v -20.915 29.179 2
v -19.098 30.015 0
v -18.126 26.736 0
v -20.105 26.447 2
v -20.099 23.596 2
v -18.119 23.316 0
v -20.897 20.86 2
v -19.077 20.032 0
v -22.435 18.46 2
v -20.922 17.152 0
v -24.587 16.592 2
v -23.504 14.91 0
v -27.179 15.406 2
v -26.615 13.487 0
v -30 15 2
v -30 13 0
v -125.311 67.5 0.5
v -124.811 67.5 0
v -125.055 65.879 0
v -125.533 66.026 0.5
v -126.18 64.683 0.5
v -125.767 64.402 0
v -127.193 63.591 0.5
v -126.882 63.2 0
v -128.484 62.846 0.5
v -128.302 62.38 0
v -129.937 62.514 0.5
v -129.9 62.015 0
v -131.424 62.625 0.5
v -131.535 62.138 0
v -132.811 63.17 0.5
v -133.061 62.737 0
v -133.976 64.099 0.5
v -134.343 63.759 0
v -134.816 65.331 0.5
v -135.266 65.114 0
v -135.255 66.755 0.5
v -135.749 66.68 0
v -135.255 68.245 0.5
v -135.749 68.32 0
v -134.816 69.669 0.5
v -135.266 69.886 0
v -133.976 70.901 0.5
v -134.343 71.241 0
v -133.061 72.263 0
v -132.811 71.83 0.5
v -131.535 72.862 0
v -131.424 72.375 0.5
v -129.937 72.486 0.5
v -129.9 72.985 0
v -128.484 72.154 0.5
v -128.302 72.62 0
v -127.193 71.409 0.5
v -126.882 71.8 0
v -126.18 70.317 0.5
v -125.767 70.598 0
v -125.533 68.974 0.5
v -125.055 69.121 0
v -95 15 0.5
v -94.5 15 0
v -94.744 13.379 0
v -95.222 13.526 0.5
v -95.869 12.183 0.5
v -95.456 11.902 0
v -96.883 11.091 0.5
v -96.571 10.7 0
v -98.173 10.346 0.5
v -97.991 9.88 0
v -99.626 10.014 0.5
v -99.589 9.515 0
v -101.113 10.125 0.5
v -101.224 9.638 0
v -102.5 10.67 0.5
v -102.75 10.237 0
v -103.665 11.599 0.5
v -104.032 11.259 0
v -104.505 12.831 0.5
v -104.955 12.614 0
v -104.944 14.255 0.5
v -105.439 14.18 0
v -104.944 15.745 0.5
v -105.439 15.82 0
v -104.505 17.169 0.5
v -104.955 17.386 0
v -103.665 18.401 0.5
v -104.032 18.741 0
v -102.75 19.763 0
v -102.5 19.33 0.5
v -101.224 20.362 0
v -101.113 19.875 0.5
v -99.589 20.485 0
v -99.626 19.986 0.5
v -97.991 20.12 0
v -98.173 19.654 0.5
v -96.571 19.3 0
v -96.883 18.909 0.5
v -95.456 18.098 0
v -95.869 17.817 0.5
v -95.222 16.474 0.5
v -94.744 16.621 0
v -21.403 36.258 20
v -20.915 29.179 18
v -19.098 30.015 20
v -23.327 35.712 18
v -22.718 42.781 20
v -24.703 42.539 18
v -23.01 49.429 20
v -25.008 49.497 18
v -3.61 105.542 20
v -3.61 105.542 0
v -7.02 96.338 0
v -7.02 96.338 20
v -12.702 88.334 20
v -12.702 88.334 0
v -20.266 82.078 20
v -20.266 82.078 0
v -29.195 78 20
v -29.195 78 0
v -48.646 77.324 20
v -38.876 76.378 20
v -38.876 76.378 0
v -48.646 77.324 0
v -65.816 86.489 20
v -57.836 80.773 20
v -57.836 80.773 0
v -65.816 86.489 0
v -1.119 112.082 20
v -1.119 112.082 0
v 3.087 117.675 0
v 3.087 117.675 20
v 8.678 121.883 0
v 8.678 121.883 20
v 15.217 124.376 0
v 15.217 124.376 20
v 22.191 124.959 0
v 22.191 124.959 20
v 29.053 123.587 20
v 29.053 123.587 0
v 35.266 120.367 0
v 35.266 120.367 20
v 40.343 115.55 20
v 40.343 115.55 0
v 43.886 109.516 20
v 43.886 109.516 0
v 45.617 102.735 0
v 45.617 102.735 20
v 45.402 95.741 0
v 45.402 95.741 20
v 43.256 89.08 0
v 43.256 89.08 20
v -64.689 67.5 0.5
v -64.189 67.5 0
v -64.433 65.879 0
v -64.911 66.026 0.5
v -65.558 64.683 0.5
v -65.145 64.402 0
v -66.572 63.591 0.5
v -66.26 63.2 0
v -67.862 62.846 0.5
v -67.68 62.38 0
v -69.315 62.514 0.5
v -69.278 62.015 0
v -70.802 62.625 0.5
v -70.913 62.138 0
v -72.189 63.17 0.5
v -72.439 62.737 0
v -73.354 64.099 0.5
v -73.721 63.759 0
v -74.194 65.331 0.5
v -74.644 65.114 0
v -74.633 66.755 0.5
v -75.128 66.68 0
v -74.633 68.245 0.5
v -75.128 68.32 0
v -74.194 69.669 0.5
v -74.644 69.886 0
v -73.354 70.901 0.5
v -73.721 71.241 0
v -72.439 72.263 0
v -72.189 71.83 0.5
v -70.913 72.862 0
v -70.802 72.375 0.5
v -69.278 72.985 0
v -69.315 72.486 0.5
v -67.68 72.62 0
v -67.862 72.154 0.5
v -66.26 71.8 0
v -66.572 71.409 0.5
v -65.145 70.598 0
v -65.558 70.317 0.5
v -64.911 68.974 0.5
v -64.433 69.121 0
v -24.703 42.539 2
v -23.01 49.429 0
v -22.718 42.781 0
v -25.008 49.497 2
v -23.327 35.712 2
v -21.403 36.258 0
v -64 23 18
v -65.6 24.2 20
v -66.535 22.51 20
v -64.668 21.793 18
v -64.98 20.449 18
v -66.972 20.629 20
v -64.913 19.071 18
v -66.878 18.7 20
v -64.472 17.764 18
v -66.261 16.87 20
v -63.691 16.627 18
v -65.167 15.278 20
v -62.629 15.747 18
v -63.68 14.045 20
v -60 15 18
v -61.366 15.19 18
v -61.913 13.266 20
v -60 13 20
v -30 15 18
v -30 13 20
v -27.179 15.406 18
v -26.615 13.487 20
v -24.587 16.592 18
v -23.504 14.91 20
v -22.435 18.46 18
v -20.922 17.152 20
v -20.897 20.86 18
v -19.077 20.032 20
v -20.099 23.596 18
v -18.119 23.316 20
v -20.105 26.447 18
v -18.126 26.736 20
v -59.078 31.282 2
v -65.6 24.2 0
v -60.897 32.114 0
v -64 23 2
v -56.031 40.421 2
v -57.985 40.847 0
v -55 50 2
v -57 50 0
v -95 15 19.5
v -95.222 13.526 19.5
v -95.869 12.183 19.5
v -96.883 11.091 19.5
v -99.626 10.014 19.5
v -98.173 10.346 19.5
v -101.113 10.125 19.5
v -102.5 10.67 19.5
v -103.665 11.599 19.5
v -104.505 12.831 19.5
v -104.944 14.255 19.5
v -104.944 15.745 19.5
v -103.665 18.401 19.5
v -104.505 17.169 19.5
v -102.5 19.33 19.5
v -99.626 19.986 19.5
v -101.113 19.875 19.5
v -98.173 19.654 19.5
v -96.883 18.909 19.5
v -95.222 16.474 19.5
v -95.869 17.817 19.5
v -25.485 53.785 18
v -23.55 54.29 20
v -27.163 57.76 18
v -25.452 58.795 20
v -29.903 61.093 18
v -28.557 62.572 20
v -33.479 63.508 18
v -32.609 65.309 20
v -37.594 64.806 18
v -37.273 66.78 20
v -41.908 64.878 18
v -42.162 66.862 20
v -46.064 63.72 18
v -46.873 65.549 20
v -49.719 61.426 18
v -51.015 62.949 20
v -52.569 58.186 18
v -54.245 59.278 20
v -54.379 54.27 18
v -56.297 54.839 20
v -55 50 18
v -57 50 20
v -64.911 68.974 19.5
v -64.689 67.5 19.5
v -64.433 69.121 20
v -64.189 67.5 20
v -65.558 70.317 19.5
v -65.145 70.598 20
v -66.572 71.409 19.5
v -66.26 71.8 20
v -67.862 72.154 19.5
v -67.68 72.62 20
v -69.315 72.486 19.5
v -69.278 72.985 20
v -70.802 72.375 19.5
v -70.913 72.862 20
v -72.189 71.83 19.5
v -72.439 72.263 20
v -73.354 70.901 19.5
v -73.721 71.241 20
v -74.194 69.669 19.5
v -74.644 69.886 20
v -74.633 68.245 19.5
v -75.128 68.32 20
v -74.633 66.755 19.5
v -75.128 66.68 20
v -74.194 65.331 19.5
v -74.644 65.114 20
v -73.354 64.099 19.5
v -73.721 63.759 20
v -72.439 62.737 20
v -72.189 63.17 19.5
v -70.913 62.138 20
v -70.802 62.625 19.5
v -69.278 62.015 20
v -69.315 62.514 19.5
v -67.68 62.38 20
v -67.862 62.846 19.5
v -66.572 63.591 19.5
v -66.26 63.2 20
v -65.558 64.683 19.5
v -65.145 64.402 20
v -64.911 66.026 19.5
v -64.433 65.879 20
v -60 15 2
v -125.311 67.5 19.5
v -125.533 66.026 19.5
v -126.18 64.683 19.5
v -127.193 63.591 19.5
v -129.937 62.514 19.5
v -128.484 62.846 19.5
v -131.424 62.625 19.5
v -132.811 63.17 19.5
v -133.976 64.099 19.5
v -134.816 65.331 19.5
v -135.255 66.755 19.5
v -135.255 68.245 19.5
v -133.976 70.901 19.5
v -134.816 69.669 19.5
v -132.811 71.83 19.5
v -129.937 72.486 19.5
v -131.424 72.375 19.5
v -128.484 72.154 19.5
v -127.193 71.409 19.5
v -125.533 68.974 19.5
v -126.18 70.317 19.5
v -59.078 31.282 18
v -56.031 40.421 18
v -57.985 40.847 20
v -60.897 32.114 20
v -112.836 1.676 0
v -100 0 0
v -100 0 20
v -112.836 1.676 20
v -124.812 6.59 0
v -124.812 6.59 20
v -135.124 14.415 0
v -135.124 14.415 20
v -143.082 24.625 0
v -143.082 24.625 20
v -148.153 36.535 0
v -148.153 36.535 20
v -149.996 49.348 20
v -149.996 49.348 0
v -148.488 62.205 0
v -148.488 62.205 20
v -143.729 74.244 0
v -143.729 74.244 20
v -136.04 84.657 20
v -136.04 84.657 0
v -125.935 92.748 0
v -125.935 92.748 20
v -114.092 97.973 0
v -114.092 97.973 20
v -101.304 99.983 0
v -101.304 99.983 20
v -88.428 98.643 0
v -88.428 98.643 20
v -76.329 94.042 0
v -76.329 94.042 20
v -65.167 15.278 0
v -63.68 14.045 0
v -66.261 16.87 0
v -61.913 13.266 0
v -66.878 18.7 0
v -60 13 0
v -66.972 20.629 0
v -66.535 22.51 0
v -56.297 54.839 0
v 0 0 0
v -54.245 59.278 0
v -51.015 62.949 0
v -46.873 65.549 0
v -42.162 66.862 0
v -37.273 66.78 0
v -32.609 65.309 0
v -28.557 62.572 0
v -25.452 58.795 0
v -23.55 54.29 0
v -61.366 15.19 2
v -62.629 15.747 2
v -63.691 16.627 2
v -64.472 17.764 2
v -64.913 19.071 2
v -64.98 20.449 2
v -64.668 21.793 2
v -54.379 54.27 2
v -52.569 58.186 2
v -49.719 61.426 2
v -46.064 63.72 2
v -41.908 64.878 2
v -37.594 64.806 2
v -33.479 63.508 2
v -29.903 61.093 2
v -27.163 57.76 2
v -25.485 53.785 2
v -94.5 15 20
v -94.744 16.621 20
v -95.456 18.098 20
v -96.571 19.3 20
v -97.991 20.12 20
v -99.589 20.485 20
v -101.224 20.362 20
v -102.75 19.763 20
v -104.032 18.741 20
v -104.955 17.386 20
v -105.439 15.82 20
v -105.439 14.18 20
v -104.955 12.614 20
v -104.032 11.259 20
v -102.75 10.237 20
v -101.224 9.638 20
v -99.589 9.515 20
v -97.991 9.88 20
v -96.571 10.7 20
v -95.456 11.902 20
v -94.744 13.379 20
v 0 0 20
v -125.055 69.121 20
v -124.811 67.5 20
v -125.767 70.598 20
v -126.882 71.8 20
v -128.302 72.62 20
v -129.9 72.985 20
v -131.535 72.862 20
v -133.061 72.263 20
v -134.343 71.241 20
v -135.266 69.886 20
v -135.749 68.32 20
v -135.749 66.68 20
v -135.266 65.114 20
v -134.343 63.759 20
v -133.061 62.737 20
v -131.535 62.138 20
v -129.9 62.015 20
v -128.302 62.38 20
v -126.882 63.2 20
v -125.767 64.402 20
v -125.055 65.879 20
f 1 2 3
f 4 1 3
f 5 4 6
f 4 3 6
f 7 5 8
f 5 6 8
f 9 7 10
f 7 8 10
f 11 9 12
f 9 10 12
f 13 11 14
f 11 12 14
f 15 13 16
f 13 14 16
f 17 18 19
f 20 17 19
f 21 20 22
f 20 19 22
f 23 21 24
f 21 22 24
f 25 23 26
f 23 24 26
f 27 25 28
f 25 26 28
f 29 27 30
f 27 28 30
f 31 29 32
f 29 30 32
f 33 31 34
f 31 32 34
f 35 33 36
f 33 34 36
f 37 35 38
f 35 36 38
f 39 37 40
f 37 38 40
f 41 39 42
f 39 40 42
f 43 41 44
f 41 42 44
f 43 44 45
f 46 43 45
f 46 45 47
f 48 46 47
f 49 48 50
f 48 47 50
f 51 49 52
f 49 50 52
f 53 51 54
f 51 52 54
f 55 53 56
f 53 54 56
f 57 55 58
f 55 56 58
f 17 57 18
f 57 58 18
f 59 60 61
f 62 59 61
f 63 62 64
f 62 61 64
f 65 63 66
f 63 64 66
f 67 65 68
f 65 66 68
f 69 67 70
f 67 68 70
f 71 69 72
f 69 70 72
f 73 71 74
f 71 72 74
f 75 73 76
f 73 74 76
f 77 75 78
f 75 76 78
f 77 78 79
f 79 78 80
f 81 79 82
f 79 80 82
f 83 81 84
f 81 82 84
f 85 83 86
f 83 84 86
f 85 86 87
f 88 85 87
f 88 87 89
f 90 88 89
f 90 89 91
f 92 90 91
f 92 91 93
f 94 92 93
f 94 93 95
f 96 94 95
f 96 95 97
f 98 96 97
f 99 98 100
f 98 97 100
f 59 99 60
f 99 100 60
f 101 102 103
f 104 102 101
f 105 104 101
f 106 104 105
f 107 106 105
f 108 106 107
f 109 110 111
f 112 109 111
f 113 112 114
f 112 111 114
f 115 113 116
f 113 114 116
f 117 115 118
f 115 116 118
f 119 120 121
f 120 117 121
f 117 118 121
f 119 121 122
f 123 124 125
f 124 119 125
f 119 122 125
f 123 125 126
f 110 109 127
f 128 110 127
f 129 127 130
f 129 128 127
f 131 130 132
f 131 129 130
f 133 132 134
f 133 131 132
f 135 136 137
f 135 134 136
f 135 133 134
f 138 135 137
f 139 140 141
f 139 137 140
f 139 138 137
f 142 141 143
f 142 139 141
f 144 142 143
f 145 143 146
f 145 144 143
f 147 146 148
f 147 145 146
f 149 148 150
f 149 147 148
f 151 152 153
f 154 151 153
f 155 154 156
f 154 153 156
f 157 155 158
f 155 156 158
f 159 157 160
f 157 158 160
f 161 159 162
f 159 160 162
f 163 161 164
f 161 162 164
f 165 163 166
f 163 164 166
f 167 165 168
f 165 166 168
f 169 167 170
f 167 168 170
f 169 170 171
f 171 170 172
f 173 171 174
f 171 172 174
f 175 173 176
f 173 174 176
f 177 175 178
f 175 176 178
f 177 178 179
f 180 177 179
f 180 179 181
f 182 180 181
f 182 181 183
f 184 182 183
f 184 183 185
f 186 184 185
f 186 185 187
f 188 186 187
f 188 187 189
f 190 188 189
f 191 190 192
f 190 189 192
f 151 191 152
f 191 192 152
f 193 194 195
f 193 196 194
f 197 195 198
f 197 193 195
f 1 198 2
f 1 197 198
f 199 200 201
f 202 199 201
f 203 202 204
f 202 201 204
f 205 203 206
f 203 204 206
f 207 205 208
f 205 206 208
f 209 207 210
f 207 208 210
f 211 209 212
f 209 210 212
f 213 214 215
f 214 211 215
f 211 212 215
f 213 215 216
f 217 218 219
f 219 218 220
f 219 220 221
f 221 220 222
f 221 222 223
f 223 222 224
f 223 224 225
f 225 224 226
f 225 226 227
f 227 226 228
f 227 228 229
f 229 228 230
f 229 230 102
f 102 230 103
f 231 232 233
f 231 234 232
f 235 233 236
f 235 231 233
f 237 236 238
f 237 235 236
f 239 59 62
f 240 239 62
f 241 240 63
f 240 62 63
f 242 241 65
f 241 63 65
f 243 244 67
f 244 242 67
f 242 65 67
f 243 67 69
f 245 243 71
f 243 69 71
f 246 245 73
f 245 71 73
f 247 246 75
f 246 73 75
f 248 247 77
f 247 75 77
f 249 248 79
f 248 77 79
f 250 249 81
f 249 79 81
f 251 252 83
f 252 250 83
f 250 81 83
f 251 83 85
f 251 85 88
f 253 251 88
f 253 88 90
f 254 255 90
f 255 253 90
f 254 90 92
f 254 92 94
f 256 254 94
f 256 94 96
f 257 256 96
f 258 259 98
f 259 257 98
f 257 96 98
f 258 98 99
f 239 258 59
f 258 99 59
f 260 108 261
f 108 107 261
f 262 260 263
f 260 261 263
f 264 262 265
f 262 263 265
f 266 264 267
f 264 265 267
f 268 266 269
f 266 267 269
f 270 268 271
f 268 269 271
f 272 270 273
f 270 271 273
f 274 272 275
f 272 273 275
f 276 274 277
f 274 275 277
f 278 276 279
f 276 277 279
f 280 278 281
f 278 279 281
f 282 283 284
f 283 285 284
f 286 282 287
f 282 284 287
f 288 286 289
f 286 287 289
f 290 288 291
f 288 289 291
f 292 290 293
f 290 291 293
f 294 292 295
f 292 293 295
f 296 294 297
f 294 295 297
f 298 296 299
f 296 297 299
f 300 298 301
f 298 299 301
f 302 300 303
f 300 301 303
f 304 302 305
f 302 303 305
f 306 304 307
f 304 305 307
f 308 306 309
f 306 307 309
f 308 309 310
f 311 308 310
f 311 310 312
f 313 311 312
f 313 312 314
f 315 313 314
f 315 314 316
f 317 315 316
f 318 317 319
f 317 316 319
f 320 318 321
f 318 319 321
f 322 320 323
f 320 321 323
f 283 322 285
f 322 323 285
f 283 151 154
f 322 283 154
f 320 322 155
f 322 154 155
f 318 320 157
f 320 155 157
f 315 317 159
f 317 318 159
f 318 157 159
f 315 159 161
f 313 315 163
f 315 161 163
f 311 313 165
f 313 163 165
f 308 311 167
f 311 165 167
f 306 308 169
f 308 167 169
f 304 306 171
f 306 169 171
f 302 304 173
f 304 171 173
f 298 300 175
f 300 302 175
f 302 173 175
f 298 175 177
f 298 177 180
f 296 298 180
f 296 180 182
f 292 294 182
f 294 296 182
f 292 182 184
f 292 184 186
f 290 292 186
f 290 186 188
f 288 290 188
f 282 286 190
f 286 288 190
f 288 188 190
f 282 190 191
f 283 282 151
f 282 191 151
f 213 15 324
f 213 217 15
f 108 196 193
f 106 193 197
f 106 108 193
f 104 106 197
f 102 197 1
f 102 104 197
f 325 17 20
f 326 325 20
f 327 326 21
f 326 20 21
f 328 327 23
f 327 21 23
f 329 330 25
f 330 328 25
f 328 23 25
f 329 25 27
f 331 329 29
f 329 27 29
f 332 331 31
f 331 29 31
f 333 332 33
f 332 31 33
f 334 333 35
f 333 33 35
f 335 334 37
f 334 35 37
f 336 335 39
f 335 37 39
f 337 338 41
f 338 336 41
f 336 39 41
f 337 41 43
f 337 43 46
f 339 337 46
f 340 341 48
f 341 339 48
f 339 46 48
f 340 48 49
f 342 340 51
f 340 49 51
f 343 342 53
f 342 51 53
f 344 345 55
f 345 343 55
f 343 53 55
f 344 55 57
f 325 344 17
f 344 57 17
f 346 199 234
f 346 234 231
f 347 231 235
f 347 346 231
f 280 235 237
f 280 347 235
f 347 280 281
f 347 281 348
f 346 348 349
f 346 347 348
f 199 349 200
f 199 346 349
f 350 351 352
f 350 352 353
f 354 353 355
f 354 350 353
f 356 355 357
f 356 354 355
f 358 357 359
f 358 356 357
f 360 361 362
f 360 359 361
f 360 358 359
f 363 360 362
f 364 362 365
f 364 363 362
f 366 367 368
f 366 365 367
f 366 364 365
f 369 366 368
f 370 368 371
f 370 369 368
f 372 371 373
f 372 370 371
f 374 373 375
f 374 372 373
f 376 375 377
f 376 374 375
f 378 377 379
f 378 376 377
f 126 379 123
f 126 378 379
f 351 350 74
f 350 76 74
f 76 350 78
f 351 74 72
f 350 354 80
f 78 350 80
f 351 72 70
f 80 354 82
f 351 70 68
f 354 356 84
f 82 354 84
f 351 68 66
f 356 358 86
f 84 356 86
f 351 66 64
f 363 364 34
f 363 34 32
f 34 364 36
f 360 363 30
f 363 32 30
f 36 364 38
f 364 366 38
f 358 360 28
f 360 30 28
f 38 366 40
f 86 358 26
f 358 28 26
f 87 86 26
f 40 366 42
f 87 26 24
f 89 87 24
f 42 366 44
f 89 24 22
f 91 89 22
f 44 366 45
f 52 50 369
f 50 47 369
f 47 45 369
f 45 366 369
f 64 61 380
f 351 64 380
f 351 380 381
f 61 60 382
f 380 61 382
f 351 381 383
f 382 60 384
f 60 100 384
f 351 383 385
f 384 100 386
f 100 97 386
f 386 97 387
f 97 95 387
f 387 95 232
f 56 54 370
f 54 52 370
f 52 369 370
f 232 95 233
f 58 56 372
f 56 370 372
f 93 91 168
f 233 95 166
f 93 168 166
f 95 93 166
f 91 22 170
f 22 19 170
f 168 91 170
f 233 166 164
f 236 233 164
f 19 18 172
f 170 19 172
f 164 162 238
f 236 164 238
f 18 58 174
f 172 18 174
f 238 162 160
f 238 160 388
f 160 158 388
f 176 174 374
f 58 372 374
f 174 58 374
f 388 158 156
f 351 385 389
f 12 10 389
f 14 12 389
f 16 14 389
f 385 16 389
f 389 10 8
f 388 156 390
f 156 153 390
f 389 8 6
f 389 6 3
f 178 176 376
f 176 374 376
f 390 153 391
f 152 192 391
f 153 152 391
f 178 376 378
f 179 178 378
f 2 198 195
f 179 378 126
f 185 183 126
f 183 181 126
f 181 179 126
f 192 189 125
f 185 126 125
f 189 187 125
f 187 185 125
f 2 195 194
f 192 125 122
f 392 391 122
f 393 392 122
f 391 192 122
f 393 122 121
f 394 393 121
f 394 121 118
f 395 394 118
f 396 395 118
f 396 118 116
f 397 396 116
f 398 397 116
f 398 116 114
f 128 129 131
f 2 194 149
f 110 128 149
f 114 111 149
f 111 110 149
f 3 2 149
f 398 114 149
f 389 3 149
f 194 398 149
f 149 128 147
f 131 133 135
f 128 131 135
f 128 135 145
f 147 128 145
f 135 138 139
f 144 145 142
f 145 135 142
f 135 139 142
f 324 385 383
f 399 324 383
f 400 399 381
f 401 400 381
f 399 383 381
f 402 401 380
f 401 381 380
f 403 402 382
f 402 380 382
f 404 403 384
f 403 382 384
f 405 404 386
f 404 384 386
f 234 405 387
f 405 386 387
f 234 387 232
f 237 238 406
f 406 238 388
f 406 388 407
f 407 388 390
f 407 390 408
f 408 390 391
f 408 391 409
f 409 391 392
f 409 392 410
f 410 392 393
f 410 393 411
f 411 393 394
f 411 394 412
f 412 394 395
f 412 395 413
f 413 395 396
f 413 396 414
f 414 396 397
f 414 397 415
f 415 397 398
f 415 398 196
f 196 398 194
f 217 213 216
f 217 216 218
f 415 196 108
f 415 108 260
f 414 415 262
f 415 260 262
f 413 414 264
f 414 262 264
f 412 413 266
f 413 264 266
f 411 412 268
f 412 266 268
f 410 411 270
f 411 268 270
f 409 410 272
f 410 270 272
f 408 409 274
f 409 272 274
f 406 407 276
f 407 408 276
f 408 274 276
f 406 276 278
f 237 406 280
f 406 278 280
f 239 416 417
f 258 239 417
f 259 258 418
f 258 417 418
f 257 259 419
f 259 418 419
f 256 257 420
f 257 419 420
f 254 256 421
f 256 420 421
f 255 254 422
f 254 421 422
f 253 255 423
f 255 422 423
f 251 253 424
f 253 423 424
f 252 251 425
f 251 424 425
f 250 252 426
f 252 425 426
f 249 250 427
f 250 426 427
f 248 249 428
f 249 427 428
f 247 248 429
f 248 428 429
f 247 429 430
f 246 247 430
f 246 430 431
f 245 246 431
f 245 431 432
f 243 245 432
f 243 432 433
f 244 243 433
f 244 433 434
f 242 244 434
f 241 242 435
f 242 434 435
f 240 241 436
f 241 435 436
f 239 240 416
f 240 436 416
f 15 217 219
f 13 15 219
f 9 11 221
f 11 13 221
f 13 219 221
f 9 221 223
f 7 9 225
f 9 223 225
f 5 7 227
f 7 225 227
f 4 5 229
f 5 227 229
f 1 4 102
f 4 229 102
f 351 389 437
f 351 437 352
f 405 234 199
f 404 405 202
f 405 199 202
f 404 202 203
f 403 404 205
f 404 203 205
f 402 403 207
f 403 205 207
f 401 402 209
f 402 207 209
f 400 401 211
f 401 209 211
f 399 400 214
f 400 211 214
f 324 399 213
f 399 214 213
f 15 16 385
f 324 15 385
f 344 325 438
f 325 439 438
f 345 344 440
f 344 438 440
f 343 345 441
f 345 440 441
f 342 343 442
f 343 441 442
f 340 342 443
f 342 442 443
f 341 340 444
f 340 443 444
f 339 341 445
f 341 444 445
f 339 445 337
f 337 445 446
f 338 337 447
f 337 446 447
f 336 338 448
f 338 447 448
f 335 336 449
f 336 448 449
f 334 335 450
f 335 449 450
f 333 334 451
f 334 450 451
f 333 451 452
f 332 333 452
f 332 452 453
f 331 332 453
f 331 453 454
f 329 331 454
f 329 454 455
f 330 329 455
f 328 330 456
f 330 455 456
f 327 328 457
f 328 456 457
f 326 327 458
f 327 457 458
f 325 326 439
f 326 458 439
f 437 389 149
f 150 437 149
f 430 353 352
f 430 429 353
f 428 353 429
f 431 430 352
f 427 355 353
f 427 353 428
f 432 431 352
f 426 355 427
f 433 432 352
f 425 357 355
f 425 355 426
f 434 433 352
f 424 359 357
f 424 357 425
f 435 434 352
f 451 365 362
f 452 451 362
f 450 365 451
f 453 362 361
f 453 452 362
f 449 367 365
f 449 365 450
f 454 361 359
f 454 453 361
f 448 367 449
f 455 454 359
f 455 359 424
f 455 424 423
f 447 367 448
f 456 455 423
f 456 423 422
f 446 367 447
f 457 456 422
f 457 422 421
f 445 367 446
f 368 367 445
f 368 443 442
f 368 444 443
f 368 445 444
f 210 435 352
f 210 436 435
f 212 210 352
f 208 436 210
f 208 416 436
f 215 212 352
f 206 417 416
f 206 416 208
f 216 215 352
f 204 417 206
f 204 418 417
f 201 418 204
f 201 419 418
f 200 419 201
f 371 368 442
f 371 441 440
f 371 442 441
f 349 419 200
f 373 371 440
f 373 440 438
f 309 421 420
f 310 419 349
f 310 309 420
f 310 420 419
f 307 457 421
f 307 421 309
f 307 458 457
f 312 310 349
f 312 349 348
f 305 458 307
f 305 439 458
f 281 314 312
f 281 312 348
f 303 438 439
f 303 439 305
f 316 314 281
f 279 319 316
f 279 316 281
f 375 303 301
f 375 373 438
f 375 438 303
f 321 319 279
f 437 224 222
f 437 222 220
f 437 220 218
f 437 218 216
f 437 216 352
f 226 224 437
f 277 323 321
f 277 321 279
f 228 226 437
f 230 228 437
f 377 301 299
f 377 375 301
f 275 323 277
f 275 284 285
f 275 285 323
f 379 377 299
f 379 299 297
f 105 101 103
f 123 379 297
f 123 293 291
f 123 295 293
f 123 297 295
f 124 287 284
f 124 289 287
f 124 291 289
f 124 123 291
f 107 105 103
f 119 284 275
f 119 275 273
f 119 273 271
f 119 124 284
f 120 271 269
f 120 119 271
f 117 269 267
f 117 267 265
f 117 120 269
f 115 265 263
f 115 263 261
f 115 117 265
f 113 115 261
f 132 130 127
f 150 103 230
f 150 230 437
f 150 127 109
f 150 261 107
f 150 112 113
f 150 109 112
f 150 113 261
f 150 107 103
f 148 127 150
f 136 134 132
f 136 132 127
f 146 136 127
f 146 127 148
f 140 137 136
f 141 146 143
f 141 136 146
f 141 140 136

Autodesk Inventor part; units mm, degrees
ref_plane "YZ Plane" through (0, 0, 0) normal (1, 0, 0) x (0, 1, 0)
ref_plane "XZ Plane" through (0, 0, 0) normal (0, 1, 0) x (-1, 0, 0)
ref_plane "XY Plane" through (0, 0, 0) normal (0, 0, 1) x (1, 0, 0)
sketch "Sketch1" plane through (0, 0, 0) normal (0, 0, 1) x (1, 0, 0)
  arc A0 (-65.8156, 86.4888) -> (-100, 0) centre (-100, 50) ccw
  line L0 (0, 0) -> (-100, 0)
  circle A1 centre (-100, 15) radius 5
  circle A2 centre (-69.6891, 67.5) radius 5
  circle A3 centre (-130.3109, 67.5) radius 5
  arc A4 (-65.8156, 86.4888) -> (-3.6104, 105.5421) centre (-40.1774, 113.8553) ccw
  arc A5 (43.2563, 89.0796) -> (-3.6104, 105.5421) centre (20.7675, 100) ccw
  line L1 (0, 0) -> (43.2563, 89.0796)
  arc A6 (-64, 23) -> (-55, 50) centre (-100, 50) ccw
  arc A7 (-64, 23) -> (-60, 15) centre (-60, 20) ccw
  line L2 (-30, 15) -> (-60, 15)
  arc A8 (-25.0084, 49.4966) -> (-55, 50) centre (-40, 50) ccw
  arc A9 (-30, 15) -> (-20.9152, 29.1794) centre (-30, 25) ccw
  arc A10 (-25.0084, 49.4966) -> (-20.9152, 29.1794) centre (19.9662, 47.9865) ccw
  point P0 (-45, 15)
  dimension "d4" = 100
  dimension "d5" = 10
  dimension "d6" = 35
  dimension "d9" = 360
  dimension "d21" = 15
  dimension "d22" = 25
  dimension "d25" = 5
  dimension "d26" = 50
  dimension "d27" = 37.5
  dimension "d28" = 17.5
  dimension "d29" = 35
  dimension "d30" = 45
  dimension "d32" = 50
  dimension "d52" = 60
  dimension "d55" = 30
  dimension "d56" = 45
  dimension "d57" = 10
  dimension "d58" = 15
extrude "Extrusion1" add sketch "Sketch1" along normal blind 20 contours A4 A5 L1 L0 A0 | A6 A8 A10 A9 L2 A7
sketch "Sketch2" plane through (0, 0, 20) normal (0, 0, 1) x (1, 0, 0)
  arc A0 (-25.0084, 49.4966) -> (-55, 50) centre (-40, 50) ccw
  arc A1 (-25.0084, 49.4966) -> (-20.9152, 29.1794) centre (19.9662, 47.9865) ccw
  arc A2 (-64, 23) -> (-60, 15) centre (-60, 20) ccw
  arc A3 (-30, 15) -> (-20.9152, 29.1794) centre (-30, 25) ccw
  line L0 (-100, 0) -> (0, 0) projected
  arc A4 (-64, 23) -> (-55, 50) centre (-100, 50) ccw
  line L1 (-30, 15) -> (-60, 15)
  dimension "d65" = 50
  dimension "d69" = 30
  dimension "d70" = 15
extrude "Extrusion2" cut sketch "Sketch2" against normal blind 20
chamfer "Chamfer1" distance 2 angle 45 6 edges at (-57.3093, 35.7698, 20) (-39.7483, 64.9979, 20) (-24.1475, 39.0991, 20) (-21.58, 19.6053, 20) (-45, 15, 20) (-64.4721, 17.7639, 20)
chamfer "Chamfer2" distance 2 angle 45 6 edges at (-57.3093, 35.7698, 0) (-64.4721, 17.7639, 0) (-45, 15, 0) (-21.58, 19.6053, 0) (-24.1475, 39.0991, 0) (-39.7483, 64.9979, 0)
chamfer "Chamfer3" distance 0.5 angle 45 3 edges at (-135.3109, 67.5, 0) (-74.6891, 67.5, 0) (-105, 15, 0)
chamfer "Chamfer4" distance 0.5 angle 45 3 edges at (-74.6891, 67.5, 20) (-135.3109, 67.5, 20) (-105, 15, 20)
thread "Thread4" size "M10x1.5" class "6H" standard "ANSI Metric M Profile" full length
thread "Thread5" size "M10x1.5" class "6H" standard "ANSI Metric M Profile" full length
thread "Thread6" size "M10x1.5" class "6H" standard "ANSI Metric M Profile" full length
properties part number "Curve Disc"
